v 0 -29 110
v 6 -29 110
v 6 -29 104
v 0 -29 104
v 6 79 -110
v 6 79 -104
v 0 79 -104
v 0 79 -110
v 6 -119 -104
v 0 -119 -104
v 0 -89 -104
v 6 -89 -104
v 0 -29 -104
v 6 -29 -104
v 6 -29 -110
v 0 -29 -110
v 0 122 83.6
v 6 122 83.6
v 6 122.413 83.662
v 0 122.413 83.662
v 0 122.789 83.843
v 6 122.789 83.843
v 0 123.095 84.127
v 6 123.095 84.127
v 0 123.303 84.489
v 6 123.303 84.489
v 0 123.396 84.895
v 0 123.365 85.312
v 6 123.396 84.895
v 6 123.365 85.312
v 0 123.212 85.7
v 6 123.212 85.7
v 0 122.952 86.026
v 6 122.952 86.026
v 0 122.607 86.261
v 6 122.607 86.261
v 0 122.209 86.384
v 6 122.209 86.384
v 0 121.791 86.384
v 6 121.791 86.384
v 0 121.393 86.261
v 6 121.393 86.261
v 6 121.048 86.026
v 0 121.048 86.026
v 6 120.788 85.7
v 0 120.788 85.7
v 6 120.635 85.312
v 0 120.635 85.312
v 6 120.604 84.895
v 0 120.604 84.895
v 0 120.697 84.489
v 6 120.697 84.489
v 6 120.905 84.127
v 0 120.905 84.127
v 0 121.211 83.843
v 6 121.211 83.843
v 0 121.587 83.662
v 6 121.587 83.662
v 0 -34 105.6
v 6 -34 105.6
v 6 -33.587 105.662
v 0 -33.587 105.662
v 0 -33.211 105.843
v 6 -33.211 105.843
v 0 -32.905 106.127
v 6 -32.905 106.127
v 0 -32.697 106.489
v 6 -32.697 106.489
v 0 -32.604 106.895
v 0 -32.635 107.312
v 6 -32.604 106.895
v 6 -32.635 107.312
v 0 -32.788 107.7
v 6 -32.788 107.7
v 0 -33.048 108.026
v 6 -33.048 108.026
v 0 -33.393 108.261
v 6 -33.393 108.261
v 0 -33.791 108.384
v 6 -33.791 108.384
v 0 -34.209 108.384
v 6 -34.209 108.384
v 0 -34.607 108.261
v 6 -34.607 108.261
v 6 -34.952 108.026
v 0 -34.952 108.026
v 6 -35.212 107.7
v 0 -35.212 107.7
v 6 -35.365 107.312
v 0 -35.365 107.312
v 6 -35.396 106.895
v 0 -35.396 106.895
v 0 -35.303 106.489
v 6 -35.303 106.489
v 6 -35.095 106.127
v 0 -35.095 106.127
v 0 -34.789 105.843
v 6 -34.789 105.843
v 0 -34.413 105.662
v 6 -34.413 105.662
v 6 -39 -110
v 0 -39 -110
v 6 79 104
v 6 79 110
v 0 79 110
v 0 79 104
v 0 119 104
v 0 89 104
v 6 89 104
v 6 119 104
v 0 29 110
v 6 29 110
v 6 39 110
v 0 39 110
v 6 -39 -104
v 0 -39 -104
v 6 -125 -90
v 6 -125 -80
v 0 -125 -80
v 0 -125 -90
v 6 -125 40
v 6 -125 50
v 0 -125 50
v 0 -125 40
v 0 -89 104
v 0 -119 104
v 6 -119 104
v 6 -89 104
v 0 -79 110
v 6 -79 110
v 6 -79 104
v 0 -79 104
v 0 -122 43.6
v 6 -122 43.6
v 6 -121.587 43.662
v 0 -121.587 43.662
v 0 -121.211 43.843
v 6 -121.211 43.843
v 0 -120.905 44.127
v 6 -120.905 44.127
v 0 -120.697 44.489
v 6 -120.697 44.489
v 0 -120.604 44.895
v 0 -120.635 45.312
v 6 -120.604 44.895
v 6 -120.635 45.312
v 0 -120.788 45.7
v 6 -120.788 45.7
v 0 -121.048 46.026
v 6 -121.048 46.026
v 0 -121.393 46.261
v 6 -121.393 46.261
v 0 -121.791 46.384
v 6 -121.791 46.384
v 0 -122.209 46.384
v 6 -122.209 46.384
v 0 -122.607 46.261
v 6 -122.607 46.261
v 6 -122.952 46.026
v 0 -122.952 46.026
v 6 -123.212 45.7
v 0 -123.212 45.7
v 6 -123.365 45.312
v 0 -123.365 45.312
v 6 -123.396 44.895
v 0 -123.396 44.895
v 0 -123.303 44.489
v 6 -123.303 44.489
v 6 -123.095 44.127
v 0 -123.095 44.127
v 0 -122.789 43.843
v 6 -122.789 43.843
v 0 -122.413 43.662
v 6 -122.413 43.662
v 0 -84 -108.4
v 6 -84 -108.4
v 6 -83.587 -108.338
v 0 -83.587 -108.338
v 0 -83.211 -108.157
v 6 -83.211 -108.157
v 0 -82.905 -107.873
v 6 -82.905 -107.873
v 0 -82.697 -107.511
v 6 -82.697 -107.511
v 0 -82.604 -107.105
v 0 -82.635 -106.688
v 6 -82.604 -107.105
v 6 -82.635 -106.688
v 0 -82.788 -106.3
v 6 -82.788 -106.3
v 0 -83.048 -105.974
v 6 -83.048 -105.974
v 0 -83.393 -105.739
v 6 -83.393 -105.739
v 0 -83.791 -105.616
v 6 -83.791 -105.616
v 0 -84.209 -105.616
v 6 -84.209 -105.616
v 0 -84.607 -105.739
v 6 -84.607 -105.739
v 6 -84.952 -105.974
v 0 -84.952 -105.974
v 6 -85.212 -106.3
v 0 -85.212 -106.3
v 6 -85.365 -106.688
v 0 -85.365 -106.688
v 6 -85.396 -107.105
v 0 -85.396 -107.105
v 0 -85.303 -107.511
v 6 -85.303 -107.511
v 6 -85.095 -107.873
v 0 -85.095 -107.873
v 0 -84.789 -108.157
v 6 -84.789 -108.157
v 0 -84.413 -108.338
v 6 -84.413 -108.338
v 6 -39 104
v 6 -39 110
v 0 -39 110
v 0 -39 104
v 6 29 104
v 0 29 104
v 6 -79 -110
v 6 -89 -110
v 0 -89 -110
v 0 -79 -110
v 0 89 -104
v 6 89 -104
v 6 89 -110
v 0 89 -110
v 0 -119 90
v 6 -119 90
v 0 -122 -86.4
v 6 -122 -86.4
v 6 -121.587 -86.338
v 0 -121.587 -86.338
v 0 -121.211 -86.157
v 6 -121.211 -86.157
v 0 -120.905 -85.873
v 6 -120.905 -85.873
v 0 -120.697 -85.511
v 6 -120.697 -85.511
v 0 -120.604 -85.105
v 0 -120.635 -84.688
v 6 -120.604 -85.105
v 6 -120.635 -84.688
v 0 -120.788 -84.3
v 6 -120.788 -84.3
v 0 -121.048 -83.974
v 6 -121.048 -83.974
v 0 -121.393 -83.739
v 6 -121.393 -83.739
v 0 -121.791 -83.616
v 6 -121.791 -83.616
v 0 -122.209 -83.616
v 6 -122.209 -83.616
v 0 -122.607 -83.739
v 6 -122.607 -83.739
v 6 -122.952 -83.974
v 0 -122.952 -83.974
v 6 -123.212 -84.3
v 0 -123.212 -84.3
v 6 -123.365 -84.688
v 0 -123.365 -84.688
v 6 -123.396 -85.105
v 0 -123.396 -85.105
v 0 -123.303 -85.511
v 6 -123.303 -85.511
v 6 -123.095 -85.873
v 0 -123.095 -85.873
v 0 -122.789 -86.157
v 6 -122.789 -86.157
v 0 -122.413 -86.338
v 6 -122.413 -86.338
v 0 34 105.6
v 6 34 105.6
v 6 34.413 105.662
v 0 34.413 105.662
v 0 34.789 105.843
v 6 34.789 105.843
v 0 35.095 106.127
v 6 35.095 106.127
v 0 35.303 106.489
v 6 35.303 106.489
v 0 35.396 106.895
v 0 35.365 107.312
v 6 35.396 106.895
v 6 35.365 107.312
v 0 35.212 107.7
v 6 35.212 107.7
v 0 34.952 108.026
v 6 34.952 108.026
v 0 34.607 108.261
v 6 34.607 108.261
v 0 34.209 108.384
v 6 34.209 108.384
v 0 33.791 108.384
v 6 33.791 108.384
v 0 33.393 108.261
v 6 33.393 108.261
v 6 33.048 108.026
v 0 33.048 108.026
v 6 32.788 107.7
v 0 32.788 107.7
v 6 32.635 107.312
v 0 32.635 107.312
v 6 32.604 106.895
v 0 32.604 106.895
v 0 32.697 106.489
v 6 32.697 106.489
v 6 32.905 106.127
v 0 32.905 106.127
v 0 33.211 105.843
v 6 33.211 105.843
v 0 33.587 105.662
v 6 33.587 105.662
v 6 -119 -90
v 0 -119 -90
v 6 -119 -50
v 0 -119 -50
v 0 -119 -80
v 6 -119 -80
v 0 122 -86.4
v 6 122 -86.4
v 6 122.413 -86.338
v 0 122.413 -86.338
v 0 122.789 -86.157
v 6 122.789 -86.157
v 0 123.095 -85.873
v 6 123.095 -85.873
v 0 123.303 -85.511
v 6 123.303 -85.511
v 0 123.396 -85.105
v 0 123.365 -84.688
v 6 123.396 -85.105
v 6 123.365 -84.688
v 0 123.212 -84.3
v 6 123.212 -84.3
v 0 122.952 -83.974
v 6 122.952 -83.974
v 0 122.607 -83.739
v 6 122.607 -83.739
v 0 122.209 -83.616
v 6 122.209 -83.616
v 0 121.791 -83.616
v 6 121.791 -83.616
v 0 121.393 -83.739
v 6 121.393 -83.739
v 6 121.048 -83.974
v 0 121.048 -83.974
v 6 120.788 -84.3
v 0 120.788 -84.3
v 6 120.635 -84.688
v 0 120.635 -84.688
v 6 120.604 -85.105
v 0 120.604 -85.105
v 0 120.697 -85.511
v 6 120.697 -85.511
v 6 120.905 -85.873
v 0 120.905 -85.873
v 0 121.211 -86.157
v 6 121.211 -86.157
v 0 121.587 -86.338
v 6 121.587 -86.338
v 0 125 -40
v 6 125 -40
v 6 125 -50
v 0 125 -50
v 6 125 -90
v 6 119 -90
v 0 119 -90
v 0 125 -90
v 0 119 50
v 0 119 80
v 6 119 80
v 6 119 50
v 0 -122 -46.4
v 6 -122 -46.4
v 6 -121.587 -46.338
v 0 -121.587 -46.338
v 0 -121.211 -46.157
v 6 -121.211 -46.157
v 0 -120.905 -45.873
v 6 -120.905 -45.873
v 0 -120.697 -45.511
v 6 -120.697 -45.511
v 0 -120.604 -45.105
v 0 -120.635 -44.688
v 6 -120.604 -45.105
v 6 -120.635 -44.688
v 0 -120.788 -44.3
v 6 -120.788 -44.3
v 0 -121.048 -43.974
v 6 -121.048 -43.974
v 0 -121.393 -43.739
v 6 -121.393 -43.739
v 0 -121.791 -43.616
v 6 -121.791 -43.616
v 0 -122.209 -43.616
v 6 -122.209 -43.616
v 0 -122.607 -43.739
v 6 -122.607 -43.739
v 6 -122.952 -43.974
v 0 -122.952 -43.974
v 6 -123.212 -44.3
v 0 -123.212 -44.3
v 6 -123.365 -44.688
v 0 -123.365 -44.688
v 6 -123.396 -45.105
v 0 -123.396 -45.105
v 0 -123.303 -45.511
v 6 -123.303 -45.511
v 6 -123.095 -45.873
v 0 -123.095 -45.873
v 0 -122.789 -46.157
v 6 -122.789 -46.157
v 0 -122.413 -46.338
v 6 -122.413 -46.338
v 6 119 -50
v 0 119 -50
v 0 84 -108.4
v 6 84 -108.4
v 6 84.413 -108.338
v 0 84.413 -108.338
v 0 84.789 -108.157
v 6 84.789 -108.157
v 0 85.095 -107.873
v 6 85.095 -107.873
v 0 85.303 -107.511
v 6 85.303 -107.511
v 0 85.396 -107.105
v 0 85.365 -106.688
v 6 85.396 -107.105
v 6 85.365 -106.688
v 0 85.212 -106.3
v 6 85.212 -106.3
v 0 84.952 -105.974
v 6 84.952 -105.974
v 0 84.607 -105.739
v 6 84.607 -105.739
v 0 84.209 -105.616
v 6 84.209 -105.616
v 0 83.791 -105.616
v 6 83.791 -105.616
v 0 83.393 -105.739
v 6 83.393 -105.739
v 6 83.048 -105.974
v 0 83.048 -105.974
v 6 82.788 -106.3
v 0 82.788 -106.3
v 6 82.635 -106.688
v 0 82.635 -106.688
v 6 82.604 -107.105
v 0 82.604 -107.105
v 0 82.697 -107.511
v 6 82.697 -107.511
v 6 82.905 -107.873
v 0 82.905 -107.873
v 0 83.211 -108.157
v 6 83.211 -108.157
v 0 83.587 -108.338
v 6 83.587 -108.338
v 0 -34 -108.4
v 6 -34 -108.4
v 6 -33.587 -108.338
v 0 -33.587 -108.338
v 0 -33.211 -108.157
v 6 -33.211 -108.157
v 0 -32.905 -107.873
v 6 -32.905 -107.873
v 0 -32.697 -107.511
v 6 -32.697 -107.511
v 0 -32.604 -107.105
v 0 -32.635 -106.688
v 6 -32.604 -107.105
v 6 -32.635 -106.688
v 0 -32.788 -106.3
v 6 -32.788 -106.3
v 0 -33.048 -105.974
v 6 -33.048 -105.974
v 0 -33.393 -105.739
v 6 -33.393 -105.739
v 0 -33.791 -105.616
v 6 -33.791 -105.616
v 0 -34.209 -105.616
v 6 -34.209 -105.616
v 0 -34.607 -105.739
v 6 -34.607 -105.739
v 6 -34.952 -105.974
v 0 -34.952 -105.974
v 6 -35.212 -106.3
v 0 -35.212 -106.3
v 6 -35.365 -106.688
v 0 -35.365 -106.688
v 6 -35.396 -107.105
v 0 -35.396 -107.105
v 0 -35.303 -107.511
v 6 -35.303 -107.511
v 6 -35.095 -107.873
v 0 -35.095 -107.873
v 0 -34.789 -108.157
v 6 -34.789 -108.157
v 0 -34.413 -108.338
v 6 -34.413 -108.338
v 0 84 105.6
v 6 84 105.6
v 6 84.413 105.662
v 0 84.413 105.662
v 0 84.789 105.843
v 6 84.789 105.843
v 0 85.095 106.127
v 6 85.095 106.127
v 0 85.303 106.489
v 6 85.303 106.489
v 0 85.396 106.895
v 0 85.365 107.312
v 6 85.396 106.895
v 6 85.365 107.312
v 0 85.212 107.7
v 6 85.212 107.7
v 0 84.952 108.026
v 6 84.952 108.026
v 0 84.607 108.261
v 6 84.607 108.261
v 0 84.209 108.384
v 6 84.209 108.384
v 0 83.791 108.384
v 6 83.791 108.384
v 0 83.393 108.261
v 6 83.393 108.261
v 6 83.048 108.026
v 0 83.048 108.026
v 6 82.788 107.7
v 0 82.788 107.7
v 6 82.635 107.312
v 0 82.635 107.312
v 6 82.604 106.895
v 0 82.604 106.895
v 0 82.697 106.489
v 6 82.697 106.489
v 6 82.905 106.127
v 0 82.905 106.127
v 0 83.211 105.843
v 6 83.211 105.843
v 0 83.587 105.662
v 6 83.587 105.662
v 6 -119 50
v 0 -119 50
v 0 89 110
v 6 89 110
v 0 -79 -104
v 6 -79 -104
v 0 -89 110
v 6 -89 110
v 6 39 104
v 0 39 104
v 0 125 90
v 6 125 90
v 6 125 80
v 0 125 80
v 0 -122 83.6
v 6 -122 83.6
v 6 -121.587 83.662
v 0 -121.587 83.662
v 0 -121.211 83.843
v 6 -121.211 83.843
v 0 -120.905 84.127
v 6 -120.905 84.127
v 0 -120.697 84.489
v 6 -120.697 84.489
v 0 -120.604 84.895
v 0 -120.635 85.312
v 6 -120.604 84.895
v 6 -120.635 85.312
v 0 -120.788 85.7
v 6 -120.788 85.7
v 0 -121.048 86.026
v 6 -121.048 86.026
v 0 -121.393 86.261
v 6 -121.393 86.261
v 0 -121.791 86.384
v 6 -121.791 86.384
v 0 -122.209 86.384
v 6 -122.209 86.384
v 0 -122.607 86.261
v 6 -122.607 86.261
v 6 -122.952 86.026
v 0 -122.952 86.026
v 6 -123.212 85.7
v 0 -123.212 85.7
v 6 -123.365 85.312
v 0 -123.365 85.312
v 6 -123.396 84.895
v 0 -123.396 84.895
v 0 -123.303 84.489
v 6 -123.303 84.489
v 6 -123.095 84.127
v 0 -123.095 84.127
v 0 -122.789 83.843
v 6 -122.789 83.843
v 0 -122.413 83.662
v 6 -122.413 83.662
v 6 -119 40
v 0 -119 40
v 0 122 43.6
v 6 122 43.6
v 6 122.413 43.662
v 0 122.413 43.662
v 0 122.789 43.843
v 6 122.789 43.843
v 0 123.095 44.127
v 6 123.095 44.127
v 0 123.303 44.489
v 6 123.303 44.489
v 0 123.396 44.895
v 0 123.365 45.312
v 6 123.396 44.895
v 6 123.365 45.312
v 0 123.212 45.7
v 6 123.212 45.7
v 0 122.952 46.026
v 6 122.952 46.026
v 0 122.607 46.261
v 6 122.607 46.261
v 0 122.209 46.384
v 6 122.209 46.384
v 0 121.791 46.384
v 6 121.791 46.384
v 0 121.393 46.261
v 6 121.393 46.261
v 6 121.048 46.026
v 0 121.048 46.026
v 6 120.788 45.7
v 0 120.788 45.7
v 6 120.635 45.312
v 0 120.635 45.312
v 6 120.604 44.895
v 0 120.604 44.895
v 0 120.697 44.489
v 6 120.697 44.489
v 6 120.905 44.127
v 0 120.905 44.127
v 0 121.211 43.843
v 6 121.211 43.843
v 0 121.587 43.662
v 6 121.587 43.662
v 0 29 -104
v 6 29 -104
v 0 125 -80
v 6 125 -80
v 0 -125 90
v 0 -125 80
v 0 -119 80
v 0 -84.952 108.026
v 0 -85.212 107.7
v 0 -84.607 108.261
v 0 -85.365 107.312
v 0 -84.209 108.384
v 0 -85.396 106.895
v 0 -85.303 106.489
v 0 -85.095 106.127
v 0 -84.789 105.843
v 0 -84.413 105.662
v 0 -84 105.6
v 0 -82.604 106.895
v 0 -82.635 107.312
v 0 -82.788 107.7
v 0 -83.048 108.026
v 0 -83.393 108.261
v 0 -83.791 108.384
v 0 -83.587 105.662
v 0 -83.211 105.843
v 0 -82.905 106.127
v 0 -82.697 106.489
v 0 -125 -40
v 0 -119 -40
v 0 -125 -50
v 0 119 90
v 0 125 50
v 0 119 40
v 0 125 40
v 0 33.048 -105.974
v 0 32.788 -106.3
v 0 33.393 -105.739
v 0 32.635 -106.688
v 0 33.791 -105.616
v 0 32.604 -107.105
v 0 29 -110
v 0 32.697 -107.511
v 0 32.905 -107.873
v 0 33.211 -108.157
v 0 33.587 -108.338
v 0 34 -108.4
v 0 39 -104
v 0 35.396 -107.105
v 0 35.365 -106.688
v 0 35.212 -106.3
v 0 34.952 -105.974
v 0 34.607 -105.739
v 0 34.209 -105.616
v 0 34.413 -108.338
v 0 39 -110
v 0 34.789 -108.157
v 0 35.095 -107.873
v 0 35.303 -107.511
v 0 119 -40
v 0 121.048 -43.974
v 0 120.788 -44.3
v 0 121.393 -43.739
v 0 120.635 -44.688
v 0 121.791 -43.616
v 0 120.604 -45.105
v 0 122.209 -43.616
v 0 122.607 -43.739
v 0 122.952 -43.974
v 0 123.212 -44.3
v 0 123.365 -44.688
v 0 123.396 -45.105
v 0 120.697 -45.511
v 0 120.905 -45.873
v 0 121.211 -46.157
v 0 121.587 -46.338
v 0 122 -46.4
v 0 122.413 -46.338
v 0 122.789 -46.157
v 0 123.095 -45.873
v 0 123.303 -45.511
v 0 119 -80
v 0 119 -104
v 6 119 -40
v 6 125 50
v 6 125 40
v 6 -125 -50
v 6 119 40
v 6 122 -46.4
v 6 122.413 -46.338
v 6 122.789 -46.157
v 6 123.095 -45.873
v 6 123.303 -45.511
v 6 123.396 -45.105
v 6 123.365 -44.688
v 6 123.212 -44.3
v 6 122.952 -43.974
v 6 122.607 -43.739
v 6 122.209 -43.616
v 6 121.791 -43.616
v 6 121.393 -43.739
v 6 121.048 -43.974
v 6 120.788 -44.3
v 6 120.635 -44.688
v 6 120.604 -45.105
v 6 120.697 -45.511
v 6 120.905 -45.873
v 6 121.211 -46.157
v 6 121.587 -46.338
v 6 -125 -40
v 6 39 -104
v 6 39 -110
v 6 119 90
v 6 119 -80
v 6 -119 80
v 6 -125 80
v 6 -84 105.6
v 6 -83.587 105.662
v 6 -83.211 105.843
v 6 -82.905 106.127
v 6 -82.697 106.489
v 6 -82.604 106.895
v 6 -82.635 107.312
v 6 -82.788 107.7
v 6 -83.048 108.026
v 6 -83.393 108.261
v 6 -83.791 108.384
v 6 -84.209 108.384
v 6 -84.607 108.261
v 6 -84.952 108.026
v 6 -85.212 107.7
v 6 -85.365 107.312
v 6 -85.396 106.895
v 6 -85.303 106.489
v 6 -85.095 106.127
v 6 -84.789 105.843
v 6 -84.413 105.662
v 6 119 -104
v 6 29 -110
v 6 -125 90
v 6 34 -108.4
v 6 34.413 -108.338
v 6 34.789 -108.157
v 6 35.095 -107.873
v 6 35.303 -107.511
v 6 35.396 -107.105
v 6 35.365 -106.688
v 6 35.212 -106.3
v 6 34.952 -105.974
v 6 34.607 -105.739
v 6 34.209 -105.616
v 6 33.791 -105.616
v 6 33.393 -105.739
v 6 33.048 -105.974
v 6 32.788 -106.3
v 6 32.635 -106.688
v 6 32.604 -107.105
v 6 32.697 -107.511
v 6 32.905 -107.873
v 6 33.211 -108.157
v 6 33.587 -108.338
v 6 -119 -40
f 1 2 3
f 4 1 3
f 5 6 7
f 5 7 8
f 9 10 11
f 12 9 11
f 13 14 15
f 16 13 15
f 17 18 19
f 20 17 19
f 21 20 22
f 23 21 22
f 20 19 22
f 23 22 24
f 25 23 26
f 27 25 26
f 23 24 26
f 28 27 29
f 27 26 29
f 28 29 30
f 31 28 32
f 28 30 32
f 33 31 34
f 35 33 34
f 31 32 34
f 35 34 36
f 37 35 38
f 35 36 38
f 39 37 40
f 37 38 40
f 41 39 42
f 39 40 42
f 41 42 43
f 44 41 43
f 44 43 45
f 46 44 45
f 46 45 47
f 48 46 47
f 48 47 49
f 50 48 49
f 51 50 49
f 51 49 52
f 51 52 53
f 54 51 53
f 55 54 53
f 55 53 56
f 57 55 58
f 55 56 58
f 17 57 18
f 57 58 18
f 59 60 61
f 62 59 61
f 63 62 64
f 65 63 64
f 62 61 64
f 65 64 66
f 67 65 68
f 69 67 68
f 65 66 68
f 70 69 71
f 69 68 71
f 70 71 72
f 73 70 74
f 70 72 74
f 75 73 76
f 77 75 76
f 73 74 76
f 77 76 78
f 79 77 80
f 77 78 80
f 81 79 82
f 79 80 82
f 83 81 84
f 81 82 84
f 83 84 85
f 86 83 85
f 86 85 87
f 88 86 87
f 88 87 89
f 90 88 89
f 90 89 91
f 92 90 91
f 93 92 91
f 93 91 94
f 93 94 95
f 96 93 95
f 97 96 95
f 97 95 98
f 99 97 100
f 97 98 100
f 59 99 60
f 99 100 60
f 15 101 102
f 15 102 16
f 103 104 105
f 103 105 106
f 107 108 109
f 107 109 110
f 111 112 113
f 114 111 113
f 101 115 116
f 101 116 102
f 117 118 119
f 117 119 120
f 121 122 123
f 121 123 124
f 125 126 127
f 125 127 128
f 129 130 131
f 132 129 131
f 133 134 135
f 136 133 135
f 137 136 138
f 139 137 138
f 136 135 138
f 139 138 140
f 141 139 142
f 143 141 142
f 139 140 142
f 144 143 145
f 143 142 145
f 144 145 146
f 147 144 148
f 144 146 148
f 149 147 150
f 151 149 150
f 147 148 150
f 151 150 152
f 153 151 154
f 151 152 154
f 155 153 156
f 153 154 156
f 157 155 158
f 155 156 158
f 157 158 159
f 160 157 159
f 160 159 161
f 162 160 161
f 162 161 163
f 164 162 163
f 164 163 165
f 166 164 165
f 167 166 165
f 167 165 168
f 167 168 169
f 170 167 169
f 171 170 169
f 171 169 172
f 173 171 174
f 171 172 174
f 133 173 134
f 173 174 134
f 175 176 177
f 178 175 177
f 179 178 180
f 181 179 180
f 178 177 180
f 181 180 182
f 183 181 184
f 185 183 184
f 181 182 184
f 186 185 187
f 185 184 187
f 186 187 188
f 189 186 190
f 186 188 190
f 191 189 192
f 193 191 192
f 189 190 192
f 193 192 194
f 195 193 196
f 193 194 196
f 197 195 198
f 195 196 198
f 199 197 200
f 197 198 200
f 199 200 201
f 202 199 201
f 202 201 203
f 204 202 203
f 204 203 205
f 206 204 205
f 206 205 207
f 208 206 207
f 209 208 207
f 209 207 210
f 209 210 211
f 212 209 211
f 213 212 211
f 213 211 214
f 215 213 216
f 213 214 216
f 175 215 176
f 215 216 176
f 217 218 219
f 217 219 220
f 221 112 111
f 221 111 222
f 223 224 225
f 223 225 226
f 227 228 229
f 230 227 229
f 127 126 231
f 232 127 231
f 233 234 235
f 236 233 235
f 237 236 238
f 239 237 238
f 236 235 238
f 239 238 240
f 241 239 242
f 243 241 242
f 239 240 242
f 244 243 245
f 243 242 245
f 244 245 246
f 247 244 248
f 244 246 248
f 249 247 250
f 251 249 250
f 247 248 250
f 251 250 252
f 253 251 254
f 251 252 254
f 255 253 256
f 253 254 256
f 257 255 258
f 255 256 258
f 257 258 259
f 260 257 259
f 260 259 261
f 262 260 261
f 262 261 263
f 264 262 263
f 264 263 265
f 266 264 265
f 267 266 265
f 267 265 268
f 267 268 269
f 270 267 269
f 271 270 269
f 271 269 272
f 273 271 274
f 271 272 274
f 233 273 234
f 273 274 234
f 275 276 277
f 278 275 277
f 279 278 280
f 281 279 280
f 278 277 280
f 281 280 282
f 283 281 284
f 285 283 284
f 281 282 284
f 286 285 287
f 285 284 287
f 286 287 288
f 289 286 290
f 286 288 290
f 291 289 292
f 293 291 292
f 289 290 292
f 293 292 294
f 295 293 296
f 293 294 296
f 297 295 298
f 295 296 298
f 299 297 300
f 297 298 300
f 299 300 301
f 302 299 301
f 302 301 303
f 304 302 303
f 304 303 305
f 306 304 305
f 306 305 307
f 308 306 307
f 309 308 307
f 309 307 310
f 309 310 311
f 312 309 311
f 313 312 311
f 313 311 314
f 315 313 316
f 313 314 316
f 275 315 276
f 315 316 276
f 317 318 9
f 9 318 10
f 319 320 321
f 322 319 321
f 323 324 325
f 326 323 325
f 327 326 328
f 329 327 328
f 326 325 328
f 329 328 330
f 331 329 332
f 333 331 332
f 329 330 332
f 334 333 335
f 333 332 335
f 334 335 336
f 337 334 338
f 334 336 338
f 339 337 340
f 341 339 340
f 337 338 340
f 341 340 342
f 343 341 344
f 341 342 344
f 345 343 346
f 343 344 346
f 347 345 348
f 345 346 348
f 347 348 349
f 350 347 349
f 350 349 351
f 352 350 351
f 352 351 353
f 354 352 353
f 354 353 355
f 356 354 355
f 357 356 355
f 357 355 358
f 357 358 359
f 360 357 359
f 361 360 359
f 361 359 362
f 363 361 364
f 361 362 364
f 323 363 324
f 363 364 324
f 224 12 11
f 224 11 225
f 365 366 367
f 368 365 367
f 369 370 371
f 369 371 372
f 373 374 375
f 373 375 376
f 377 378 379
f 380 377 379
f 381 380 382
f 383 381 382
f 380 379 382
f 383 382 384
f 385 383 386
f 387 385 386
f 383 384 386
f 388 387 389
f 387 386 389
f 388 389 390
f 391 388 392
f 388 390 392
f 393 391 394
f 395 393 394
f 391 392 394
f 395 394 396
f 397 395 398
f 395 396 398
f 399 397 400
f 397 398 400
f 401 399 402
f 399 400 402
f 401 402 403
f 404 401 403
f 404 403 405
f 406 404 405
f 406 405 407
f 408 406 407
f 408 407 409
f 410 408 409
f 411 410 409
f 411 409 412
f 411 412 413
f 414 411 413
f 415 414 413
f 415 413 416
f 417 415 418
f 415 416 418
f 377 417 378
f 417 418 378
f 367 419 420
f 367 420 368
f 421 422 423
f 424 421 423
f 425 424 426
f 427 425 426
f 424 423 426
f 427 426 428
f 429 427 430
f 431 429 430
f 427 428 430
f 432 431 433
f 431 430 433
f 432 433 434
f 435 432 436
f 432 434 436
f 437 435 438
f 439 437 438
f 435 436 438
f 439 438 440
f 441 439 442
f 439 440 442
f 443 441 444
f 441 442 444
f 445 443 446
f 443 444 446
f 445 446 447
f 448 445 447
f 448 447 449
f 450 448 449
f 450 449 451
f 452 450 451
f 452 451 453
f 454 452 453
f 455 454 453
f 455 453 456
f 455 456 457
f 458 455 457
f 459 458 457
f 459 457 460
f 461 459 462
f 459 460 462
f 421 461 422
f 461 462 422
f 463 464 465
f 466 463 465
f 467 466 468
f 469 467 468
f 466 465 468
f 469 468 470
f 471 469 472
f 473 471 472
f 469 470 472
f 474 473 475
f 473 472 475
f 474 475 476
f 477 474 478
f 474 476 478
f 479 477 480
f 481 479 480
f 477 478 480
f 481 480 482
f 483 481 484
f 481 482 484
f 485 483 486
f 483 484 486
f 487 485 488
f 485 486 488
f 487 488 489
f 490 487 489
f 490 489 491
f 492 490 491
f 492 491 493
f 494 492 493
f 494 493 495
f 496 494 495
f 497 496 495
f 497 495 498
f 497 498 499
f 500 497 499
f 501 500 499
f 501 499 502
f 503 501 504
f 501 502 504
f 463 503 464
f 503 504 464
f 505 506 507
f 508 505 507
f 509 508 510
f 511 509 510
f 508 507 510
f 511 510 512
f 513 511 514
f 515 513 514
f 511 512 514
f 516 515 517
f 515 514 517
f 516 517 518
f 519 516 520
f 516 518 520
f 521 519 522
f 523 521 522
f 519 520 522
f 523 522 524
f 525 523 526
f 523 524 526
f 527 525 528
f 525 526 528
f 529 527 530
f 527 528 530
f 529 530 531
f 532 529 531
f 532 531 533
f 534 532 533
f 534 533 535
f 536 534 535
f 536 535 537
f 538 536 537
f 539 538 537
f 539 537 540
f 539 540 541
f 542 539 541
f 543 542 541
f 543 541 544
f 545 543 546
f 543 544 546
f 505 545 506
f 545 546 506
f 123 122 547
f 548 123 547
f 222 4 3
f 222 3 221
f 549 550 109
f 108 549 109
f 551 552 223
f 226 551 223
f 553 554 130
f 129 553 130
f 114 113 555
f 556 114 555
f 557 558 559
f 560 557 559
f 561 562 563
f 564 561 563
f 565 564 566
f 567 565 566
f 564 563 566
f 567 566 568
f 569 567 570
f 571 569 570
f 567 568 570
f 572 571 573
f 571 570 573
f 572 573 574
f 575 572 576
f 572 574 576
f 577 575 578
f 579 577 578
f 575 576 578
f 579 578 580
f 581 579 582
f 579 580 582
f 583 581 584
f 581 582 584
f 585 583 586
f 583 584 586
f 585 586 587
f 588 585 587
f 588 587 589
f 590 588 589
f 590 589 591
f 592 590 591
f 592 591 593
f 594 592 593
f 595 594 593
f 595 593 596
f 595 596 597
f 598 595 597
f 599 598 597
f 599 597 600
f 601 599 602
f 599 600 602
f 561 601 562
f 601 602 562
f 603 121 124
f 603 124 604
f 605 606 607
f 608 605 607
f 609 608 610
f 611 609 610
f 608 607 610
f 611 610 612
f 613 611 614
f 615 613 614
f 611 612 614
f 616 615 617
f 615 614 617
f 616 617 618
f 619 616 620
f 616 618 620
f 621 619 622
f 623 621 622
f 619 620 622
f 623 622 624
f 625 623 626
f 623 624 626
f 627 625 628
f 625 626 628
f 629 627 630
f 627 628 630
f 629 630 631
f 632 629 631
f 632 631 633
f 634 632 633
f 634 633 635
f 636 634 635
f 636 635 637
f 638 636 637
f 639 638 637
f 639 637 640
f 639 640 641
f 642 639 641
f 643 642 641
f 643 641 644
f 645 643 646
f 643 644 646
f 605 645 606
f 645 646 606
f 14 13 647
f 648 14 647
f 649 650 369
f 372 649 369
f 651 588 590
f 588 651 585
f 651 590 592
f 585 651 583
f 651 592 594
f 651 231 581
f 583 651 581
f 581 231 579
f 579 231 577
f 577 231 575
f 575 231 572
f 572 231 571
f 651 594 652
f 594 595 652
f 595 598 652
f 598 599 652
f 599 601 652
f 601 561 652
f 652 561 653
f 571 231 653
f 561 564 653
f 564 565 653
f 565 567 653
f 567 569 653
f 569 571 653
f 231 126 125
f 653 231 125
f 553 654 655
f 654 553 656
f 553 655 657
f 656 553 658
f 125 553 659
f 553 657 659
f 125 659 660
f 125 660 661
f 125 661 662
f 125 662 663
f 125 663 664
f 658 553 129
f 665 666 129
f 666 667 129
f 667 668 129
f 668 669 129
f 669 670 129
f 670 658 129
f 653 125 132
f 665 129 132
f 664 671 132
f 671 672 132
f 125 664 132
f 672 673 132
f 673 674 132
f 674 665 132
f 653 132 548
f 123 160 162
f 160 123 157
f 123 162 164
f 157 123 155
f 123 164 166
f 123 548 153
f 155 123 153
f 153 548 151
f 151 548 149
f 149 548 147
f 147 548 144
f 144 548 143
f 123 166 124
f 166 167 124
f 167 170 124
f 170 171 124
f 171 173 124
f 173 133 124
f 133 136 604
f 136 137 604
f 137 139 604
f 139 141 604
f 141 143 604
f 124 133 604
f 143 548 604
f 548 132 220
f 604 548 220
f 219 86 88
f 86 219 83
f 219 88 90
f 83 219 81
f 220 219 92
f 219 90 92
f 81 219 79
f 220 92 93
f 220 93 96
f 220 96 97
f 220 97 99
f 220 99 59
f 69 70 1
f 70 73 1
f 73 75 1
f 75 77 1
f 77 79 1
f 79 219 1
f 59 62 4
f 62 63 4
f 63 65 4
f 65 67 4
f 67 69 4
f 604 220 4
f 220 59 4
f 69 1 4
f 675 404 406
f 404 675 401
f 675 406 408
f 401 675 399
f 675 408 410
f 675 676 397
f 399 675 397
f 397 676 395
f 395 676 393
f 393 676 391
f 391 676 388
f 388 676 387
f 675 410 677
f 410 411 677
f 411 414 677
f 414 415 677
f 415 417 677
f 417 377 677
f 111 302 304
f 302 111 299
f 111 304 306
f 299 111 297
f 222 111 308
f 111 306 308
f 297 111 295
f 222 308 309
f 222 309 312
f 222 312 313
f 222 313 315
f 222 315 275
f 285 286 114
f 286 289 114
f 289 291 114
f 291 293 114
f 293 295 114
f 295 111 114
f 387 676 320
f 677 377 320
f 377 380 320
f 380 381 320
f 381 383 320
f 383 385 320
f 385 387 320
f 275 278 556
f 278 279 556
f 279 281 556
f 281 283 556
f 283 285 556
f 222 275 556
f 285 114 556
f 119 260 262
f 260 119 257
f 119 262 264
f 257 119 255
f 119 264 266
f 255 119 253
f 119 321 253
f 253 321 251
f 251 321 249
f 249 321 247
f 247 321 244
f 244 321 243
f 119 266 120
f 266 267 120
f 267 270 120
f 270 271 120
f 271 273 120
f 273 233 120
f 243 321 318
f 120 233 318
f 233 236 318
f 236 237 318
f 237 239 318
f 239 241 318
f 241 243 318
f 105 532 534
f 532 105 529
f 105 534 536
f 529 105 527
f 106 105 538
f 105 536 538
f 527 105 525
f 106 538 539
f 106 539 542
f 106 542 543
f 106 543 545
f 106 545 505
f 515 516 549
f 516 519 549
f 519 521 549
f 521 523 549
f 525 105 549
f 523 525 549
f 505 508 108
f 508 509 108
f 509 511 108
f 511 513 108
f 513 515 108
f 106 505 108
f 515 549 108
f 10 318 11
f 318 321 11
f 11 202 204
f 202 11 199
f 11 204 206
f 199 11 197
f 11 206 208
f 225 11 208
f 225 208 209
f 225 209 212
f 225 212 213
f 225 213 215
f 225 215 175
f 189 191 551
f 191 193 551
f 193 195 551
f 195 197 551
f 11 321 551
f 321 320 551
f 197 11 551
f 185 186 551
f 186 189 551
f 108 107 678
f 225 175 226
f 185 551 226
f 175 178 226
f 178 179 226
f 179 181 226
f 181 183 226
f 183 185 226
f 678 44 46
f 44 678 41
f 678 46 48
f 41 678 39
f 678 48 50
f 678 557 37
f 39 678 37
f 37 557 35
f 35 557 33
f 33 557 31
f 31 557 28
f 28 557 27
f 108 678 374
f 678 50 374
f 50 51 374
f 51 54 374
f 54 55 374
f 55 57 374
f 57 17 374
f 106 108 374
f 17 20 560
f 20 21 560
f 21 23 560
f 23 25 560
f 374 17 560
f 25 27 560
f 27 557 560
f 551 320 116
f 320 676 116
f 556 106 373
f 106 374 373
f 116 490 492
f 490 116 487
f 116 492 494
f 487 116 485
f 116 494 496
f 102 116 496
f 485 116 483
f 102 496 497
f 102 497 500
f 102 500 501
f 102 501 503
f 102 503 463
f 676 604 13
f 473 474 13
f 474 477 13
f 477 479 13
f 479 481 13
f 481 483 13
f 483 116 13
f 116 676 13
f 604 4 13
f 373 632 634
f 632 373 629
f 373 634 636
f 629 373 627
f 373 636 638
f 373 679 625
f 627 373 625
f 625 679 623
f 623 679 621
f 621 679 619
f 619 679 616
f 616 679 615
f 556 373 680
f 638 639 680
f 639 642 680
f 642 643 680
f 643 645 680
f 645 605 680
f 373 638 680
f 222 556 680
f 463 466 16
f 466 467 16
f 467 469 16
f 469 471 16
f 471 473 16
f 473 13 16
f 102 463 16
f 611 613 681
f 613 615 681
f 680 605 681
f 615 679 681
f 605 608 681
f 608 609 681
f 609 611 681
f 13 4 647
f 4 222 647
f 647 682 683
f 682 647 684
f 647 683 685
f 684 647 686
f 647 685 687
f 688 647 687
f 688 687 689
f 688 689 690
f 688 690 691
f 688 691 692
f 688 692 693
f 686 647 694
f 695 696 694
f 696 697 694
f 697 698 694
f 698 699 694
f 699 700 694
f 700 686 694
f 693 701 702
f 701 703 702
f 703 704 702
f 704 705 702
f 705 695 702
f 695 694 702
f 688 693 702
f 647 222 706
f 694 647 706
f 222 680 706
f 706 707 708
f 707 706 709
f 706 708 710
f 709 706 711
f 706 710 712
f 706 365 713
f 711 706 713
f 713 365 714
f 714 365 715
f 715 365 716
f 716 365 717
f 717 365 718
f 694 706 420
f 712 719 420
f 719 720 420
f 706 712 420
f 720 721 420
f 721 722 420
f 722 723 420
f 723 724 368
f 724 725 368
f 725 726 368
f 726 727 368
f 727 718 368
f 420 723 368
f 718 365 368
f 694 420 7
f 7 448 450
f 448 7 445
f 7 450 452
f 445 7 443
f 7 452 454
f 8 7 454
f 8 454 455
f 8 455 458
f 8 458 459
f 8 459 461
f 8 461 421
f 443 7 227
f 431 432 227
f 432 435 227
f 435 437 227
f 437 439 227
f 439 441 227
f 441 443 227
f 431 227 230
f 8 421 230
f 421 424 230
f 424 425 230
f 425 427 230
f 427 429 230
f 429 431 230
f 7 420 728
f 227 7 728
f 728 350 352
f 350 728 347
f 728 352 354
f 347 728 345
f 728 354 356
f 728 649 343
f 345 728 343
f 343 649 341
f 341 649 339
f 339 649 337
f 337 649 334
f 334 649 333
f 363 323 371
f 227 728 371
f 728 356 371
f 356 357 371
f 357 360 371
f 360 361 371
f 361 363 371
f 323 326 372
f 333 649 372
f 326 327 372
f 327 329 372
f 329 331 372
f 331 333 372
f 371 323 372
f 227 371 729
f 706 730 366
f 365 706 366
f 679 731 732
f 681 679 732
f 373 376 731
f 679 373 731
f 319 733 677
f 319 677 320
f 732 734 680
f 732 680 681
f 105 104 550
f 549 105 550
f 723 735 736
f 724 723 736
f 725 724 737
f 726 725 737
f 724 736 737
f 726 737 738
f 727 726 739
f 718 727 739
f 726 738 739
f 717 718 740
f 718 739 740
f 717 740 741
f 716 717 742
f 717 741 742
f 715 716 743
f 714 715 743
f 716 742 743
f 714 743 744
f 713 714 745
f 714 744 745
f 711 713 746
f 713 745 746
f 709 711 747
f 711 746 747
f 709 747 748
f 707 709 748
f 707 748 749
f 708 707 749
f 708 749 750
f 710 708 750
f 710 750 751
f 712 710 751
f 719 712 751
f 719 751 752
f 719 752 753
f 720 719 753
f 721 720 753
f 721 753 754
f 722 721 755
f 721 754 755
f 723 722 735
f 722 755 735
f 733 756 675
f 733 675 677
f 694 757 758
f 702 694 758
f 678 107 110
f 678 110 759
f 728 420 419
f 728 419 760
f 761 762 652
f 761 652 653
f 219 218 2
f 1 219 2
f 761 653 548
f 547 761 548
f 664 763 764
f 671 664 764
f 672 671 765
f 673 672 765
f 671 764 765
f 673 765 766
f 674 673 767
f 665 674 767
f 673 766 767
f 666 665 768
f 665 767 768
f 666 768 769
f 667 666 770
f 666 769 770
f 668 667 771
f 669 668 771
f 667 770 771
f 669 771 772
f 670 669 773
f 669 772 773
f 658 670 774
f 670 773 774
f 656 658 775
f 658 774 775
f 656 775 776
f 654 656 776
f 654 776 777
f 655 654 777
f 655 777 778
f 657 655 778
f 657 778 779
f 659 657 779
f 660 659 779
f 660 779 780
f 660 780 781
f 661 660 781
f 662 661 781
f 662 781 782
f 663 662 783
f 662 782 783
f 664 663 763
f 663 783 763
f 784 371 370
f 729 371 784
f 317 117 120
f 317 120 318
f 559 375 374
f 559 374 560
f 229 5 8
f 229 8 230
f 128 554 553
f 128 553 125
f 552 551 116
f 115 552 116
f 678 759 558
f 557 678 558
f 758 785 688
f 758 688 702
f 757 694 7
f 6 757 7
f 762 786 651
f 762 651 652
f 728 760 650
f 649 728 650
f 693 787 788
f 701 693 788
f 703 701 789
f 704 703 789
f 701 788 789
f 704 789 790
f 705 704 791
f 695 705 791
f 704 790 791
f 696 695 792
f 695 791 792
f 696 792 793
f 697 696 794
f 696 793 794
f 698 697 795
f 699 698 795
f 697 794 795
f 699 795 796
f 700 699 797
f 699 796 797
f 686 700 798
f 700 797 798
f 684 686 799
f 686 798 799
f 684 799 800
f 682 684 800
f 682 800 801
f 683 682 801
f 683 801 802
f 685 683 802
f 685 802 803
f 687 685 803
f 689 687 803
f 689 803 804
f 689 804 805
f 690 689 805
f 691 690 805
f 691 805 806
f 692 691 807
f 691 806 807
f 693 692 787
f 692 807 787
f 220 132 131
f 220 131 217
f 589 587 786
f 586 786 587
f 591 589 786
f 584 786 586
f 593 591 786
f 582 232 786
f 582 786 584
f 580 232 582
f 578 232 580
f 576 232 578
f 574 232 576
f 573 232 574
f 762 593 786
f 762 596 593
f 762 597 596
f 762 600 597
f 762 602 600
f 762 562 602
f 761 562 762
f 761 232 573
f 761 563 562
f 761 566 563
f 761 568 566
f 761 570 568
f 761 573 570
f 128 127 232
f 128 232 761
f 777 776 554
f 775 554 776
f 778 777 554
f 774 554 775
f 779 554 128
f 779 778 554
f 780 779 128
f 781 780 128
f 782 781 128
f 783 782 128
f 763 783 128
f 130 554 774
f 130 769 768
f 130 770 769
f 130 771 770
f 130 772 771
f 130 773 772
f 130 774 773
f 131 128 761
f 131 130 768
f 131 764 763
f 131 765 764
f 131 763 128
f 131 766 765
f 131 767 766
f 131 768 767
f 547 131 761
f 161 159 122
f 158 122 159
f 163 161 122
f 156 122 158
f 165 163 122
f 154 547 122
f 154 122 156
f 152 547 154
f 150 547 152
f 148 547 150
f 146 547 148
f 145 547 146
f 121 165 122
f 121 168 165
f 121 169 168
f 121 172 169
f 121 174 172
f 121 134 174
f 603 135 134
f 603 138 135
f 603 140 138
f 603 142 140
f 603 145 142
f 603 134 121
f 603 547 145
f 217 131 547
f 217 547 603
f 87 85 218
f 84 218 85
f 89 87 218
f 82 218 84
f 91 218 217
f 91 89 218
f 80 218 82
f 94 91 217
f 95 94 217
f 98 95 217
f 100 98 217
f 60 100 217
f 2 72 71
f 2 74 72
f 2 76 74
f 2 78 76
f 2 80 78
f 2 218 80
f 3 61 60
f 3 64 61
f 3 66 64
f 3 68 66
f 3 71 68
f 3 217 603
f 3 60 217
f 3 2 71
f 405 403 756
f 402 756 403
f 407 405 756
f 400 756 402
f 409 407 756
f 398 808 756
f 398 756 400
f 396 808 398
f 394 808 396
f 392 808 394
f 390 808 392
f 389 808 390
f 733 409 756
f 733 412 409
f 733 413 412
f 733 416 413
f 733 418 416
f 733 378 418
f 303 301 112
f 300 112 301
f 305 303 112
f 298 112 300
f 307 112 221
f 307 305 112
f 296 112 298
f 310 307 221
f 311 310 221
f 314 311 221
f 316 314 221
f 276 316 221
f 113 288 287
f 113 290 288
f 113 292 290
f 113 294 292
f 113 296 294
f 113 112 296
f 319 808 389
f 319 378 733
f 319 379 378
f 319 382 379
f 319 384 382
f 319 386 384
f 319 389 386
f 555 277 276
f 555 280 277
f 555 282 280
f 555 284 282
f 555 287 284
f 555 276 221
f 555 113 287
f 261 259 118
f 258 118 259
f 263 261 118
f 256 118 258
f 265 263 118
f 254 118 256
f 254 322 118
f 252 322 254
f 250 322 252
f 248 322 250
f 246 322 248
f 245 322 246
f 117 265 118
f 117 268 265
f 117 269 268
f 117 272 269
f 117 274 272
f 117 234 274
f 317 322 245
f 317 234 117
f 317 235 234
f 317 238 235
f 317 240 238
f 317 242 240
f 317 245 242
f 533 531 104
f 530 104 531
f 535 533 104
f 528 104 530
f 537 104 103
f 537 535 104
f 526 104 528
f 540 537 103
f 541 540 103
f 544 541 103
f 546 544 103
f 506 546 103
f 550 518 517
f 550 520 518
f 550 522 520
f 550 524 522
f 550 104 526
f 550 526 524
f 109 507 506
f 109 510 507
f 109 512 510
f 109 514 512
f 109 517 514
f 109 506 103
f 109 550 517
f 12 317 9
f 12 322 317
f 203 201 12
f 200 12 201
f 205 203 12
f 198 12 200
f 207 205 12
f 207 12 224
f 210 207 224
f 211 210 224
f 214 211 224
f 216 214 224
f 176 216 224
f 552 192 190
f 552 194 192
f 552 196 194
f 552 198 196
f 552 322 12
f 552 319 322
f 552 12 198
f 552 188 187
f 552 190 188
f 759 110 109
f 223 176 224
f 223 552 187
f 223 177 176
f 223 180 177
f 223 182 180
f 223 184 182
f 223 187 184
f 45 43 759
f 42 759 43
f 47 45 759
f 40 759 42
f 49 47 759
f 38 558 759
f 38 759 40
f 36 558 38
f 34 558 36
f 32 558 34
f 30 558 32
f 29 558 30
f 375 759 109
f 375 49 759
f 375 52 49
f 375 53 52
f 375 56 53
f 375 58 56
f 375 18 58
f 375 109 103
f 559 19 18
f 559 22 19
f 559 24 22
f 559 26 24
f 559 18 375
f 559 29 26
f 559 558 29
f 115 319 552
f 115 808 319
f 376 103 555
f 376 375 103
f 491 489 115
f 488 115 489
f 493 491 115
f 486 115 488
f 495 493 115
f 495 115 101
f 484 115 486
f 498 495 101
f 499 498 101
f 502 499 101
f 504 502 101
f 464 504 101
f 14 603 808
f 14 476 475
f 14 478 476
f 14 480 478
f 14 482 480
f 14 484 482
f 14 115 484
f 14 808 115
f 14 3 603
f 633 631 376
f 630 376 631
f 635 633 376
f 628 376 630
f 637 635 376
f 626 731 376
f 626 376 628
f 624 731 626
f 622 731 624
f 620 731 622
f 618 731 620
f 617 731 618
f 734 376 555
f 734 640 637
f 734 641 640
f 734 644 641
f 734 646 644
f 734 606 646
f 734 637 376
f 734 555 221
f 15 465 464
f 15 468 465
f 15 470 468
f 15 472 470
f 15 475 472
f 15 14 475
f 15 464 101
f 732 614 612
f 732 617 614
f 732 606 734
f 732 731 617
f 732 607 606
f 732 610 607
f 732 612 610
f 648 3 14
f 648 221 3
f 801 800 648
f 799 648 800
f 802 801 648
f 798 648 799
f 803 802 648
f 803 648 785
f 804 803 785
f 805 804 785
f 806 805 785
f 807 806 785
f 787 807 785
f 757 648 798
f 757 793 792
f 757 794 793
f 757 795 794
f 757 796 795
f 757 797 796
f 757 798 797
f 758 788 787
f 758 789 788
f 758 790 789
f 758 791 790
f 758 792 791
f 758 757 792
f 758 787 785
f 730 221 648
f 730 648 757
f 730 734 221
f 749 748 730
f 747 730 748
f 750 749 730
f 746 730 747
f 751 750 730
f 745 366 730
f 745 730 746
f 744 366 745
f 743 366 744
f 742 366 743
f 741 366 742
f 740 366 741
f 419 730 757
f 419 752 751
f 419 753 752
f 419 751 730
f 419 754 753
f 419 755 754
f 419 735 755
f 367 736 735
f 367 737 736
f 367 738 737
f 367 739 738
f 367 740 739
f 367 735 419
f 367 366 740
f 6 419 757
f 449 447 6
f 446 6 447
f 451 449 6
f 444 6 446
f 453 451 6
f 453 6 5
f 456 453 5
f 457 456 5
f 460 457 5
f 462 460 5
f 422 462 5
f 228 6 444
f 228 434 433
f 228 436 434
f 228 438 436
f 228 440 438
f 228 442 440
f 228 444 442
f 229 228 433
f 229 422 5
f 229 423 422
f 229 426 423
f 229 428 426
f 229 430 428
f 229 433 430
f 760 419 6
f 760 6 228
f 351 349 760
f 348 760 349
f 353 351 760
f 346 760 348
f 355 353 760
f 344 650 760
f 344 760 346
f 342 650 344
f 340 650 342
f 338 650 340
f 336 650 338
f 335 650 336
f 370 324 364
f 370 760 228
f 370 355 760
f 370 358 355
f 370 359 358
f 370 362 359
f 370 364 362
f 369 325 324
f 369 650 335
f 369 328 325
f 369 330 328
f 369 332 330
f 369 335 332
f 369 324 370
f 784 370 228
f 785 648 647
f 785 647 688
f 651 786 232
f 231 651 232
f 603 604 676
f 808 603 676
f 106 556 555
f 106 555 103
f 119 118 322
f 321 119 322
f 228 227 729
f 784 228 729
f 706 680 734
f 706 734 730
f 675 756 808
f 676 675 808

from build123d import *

# Parameters (mm, degrees)
ESQUISSE1_W             = 208
ESQUISSE1_H             = 238
BOSS_EXTRU_1_DEPTH      = 6
ESQUISSE3_W             = 10
ESQUISSE3_H             = 6
ESQUISSE3_W_2           = 6
ESQUISSE3_H_2           = 10
BOSS_EXTRU_5_DEPTH      = 6
ESQUISSE4_R             = 1.4
ENL_V_MAT_EXTRU_1_DEPTH = 6


with BuildPart() as part:
    # Esquisse1 → Boss.-Extru.1 (new body)
    with BuildSketch(Plane(origin=(0, 0, 0), x_dir=(0, 0, -1), z_dir=(1, 0, 0))):
        Rectangle(ESQUISSE1_W, ESQUISSE1_H)
    extrude(amount=BOSS_EXTRU_1_DEPTH)

    # Esquisse3 → Boss.-Extru.5 (add)
    with BuildSketch(Plane(origin=(6, 0, 0), x_dir=(0, 0, -1), z_dir=(1, 0, 0))):
        with Locations((-85, -122)):
            Rectangle(ESQUISSE3_W, ESQUISSE3_H)
        with Locations((-45, -122)):
            Rectangle(ESQUISSE3_W, ESQUISSE3_H)
        with Locations((107, -34)):
            Rectangle(ESQUISSE3_W_2, ESQUISSE3_H_2)
        with Locations((-107, -84)):
            Rectangle(ESQUISSE3_W_2, ESQUISSE3_H_2)
        with Locations((-107, -34)):
            Rectangle(ESQUISSE3_W_2, ESQUISSE3_H_2)
        with Locations((107, -84)):
            Rectangle(ESQUISSE3_W_2, ESQUISSE3_H_2)
        with Locations((45, -122)):
            Rectangle(ESQUISSE3_W, ESQUISSE3_H)
        with Locations((85, -122)):
            Rectangle(ESQUISSE3_W, ESQUISSE3_H)
        with Locations((85, 122)):
            Rectangle(ESQUISSE3_W, ESQUISSE3_H)
        with Locations((45, 122)):
            Rectangle(ESQUISSE3_W, ESQUISSE3_H)
        with Locations((107, 84)):
            Rectangle(ESQUISSE3_W_2, ESQUISSE3_H_2)
        with Locations((107, 34)):
            Rectangle(ESQUISSE3_W_2, ESQUISSE3_H_2)
        with Locations((-107, 34)):
            Rectangle(ESQUISSE3_W_2, ESQUISSE3_H_2)
        with Locations((-107, 84)):
            Rectangle(ESQUISSE3_W_2, ESQUISSE3_H_2)
        with Locations((-45, 122)):
            Rectangle(ESQUISSE3_W, ESQUISSE3_H)
        with Locations((-85, 122)):
            Rectangle(ESQUISSE3_W, ESQUISSE3_H)
    extrude(amount=-BOSS_EXTRU_5_DEPTH)

    # Esquisse4 → Enlèv. mat.-Extru.1 (cut)
    with BuildSketch(Plane(origin=(6, 0, 0), x_dir=(0, 0, -1), z_dir=(1, 0, 0))):
        with Locations((-85, 122)):
            Circle(ESQUISSE4_R)
        with Locations((-45, 122)):
            Circle(ESQUISSE4_R)
        with Locations((-107, 84)):
            Circle(ESQUISSE4_R)
        with Locations((-107, 34)):
            Circle(ESQUISSE4_R)
        with Locations((107, 34)):
            Circle(ESQUISSE4_R)
        with Locations((107, 84)):
            Circle(ESQUISSE4_R)
        with Locations((45, 122)):
            Circle(ESQUISSE4_R)
        with Locations((85, 122)):
            Circle(ESQUISSE4_R)
        with Locations((85, -122)):
            Circle(ESQUISSE4_R)
        with Locations((45, -122)):
            Circle(ESQUISSE4_R)
        with Locations((107, -84)):
            Circle(ESQUISSE4_R)
        with Locations((107, -34)):
            Circle(ESQUISSE4_R)
        with Locations((-107, -34)):
            Circle(ESQUISSE4_R)
        with Locations((-107, -84)):
            Circle(ESQUISSE4_R)
        with Locations((-45, -122)):
            Circle(ESQUISSE4_R)
        with Locations((-85, -122)):
            Circle(ESQUISSE4_R)
    extrude(amount=-ENL_V_MAT_EXTRU_1_DEPTH, mode=Mode.SUBTRACT)


solid = part.part
